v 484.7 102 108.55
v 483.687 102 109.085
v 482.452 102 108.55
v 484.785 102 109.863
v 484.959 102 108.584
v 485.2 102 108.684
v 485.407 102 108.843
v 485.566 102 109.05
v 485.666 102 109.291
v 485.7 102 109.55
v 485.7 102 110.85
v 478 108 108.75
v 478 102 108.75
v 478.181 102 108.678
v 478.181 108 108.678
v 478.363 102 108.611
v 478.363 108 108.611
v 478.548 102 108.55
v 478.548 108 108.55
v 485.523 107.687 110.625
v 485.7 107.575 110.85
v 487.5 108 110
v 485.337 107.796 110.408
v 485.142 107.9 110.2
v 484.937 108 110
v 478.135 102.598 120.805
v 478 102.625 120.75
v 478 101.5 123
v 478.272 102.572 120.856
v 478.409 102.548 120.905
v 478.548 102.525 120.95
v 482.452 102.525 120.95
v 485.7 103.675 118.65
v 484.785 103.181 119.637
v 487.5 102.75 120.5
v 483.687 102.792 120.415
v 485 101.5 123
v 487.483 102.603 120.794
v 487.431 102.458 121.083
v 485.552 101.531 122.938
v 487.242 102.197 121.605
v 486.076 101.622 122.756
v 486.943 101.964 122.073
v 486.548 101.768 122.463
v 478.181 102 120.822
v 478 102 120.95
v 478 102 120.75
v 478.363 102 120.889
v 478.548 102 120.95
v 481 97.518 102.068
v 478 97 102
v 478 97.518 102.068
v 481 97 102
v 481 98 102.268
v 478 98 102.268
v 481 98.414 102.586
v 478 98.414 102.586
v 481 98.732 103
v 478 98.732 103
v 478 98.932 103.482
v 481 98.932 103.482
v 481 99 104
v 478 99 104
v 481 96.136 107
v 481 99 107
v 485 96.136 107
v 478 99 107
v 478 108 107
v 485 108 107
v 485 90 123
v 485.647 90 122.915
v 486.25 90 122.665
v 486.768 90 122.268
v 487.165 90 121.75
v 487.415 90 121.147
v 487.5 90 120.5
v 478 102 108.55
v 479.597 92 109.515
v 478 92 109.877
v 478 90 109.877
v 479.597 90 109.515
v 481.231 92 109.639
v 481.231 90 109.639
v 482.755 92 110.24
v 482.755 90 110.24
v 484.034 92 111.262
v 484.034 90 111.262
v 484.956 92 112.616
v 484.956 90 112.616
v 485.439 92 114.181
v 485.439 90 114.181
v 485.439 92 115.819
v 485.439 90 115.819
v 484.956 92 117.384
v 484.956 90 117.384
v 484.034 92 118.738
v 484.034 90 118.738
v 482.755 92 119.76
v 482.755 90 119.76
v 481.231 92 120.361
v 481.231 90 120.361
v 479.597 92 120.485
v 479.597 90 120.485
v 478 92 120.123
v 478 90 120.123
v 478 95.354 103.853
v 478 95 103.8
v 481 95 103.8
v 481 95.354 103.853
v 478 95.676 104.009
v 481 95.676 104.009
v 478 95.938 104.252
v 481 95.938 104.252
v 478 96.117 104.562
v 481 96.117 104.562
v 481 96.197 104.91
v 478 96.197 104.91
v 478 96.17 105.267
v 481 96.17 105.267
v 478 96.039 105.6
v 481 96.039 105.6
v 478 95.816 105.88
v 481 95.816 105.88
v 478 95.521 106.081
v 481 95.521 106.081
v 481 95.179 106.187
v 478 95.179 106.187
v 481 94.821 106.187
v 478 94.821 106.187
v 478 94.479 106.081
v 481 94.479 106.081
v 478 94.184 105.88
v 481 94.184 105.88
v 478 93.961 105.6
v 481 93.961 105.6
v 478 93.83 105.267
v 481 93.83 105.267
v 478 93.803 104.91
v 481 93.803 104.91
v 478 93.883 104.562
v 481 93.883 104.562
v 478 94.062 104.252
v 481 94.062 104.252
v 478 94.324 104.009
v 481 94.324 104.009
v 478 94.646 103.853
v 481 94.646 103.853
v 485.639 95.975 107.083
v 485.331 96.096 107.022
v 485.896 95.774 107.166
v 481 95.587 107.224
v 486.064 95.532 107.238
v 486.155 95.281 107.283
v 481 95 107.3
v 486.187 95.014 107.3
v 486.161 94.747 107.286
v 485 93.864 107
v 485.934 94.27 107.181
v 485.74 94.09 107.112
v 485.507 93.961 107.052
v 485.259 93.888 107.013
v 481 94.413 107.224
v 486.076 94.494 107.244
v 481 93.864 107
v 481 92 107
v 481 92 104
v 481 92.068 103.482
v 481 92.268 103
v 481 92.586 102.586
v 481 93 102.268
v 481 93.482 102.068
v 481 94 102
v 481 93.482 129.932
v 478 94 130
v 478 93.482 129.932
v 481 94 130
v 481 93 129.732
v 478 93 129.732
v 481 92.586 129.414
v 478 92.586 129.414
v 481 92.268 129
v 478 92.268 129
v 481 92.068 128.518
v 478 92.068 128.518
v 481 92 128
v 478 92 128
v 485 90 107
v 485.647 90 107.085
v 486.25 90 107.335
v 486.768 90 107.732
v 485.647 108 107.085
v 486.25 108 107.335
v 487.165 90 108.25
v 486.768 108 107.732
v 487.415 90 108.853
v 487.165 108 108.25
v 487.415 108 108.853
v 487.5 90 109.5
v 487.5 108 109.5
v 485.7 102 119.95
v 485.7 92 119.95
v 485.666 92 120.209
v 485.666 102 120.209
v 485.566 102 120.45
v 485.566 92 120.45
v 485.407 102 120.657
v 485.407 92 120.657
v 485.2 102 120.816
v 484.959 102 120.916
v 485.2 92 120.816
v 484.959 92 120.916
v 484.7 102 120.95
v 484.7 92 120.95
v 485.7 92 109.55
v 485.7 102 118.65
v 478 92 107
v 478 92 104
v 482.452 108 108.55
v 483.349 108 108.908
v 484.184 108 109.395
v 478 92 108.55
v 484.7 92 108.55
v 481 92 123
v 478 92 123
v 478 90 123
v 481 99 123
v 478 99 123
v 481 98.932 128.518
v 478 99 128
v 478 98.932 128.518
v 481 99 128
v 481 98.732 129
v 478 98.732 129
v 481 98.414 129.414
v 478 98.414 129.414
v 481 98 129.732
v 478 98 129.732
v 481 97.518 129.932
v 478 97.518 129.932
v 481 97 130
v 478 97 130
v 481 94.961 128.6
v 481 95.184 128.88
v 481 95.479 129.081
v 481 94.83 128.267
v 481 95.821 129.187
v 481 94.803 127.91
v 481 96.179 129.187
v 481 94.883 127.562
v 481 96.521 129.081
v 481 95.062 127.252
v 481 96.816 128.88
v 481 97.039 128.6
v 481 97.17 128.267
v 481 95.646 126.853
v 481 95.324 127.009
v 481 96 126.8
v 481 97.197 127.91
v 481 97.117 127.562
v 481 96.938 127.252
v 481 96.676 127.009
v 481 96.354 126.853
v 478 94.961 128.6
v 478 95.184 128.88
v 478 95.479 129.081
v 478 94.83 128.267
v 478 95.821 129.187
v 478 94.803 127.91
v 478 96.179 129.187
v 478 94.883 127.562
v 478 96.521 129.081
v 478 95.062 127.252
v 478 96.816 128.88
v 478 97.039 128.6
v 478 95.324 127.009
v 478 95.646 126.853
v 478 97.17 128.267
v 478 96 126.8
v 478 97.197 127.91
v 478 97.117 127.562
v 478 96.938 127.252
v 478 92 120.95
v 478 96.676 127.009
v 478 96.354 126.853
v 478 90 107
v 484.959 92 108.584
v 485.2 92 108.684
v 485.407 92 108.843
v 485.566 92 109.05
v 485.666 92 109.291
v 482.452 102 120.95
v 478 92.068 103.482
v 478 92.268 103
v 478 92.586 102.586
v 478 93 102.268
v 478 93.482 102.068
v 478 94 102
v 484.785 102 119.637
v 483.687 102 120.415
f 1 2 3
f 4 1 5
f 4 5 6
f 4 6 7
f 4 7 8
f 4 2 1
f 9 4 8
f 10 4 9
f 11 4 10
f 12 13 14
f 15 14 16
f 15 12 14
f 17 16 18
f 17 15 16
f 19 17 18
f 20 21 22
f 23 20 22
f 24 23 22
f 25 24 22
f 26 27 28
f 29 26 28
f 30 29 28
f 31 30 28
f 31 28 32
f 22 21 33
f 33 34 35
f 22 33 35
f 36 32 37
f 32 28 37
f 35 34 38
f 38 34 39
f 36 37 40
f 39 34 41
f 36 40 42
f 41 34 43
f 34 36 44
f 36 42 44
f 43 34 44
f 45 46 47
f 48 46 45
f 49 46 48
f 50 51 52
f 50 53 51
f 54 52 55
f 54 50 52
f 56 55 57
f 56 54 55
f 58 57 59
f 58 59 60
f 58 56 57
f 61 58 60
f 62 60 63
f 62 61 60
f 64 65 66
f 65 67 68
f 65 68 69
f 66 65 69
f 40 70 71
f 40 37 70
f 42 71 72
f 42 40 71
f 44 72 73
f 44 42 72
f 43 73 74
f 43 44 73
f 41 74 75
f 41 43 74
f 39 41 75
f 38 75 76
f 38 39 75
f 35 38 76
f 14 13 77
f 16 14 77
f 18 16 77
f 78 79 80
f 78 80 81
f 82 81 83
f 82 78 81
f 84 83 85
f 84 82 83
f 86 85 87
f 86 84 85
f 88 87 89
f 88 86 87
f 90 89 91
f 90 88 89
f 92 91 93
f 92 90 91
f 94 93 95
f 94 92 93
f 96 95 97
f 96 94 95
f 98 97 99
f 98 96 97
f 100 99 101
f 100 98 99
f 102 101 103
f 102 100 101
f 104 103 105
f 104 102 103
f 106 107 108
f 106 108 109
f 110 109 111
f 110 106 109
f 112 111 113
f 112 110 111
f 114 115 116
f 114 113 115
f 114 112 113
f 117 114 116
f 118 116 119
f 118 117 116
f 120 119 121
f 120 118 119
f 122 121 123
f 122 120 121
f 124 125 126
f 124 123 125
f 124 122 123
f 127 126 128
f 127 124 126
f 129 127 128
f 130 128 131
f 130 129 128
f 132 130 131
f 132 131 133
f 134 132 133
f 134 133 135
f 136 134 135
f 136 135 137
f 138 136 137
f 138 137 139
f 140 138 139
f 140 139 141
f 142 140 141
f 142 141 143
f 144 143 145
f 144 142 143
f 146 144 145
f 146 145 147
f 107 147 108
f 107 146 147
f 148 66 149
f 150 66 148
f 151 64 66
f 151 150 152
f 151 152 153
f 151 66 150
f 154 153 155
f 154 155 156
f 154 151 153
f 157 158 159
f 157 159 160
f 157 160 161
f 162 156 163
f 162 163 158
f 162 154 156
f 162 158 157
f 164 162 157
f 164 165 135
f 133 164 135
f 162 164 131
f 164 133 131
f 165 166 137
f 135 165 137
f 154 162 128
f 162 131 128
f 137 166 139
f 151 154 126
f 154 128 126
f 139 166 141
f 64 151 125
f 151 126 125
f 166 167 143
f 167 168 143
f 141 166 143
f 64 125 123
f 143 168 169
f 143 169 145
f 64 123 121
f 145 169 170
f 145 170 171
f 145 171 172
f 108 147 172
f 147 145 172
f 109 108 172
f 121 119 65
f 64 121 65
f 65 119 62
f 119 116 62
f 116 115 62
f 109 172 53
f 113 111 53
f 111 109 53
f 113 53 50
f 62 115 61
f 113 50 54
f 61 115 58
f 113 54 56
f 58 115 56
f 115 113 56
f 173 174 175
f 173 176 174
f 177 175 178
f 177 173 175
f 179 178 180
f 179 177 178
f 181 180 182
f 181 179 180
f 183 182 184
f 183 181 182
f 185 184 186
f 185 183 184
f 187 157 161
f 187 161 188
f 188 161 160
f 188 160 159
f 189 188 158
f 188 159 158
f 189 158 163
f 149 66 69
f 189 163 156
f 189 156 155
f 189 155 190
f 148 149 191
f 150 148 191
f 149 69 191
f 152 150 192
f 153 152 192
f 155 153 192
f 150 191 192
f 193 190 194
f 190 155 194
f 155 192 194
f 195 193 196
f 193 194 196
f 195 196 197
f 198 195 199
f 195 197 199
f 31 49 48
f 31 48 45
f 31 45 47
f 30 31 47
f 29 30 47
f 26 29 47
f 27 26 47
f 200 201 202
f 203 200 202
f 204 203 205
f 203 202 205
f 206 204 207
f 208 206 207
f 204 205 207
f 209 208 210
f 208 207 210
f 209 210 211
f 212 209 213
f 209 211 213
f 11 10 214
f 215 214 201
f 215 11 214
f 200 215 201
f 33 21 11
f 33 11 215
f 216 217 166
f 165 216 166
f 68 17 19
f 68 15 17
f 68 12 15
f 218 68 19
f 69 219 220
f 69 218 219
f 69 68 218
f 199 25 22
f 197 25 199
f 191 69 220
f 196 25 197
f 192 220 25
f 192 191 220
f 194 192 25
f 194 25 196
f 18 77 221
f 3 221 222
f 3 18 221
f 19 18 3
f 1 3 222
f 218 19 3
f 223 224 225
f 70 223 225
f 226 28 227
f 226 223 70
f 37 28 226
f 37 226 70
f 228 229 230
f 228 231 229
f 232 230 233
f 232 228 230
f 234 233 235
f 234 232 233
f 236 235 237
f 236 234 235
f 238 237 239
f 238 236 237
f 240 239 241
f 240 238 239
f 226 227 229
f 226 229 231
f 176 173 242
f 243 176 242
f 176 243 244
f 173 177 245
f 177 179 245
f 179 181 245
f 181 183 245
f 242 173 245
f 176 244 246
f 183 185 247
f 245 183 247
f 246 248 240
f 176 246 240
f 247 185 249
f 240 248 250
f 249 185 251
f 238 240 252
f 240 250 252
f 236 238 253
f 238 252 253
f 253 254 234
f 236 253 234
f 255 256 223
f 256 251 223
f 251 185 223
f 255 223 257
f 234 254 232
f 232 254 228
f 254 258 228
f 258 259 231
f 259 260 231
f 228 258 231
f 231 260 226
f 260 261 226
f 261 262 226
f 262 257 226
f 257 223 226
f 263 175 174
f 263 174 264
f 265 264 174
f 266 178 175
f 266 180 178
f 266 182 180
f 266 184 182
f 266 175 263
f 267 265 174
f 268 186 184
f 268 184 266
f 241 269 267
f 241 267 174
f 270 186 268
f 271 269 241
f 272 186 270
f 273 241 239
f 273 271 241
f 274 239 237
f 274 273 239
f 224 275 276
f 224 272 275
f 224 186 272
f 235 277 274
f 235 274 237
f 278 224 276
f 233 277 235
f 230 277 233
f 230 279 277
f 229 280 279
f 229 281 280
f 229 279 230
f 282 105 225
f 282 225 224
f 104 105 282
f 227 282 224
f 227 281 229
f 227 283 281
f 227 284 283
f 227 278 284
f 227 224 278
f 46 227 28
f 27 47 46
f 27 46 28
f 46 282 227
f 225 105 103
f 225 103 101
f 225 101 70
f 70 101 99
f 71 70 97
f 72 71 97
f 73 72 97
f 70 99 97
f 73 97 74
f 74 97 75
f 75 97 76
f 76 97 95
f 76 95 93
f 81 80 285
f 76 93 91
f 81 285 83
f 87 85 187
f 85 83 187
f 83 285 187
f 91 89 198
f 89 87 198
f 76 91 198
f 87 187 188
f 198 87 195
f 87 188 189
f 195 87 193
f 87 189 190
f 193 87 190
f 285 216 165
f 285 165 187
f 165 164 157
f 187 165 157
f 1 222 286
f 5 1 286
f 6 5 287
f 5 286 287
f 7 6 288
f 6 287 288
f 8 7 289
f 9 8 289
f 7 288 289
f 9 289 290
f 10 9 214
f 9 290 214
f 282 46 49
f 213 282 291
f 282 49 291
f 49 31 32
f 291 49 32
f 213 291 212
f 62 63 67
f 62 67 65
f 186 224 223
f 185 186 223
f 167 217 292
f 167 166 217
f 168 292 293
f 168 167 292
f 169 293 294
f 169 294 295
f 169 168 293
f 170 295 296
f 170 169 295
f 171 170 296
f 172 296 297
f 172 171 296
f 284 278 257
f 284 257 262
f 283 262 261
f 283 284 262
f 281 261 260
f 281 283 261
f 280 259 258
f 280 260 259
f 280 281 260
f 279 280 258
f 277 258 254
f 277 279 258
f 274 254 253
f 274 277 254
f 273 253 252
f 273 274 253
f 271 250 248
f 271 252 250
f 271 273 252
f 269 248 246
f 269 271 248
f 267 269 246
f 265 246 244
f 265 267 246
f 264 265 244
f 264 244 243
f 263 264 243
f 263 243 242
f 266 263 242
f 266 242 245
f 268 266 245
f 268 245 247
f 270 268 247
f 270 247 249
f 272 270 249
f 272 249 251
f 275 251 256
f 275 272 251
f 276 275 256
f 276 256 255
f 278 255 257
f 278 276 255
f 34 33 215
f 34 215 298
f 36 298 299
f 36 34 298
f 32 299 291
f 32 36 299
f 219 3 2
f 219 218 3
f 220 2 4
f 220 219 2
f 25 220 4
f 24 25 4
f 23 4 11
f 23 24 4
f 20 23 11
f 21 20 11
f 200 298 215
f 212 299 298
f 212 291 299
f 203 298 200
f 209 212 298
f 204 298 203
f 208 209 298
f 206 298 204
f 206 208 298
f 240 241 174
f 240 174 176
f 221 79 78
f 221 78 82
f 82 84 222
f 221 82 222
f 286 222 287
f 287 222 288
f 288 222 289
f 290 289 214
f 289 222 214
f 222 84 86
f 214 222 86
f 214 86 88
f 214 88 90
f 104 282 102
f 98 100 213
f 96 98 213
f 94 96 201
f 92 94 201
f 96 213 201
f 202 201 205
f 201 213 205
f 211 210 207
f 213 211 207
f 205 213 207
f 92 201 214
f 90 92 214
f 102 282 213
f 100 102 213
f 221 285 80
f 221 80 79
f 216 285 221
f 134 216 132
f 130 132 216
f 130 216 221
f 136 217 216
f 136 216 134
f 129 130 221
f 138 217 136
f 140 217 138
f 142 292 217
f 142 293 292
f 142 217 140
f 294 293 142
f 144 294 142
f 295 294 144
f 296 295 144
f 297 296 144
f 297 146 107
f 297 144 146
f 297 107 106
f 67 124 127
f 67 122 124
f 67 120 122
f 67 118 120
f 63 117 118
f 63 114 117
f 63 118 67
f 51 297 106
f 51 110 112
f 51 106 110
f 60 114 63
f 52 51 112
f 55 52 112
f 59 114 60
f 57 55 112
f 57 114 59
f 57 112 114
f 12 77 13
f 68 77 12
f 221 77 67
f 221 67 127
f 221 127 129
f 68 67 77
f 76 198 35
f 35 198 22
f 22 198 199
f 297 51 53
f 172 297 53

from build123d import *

# Parameters (mm, degrees)
BOX520_W                  = 10.4
BOX520_H                  = 12.4
BOX520_DEPTH              = 27
FILLET403_R               = 1
CYLINDER1231_R            = 8
CYLINDER1231_DEPTH        = 27
CYLINDER1233_R            = 6.5
CYLINDER1233_DEPTH        = 17
CYLINDER1232_R            = 8
CYLINDER1232_DEPTH        = 17
CYLINDER1234_R            = 8
CYLINDER1234_DEPTH        = 27
CUT014272_PLACEMENT_ANGLE = 90
CYLINDER1230_R            = 5.5
CYLINDER1230_DEPTH        = 15
CYLINDER1229_R            = 1.2
CYLINDER1229_DEPTH        = 11
CYLINDER1228_R            = 1.2
CYLINDER1228_DEPTH        = 11
CYLINDER1275_R            = 2.3
CYLINDER1275_DEPTH        = 11
BOX519_W                  = 9.5
BOX519_H                  = 18
BOX519_DEPTH              = 16
CHAMFER036_SIZE2          = 6.5
CHAMFER036_SIZE           = 13
FILLET409_R               = 2.5
BOX542_W                  = 3
BOX542_H                  = 7
BOX542_DEPTH              = 28
FILLET415_R               = 2


with BuildPart() as fillet403:
    # Box520 → Box520 (new body)
    with BuildSketch(Plane(origin=(-5.2, -6.2, 0), x_dir=(1, 0, 0), z_dir=(0, 0, 1))):
        with Locations((5.2, 6.2)):
            Rectangle(BOX520_W, BOX520_H)
    extrude(amount=BOX520_DEPTH)

    # Fillet403
    fillet403_edges = [fillet403.edges().sort_by_distance(p)[0] for p in [
        (-5.2, -6.2, 13.5),
        (-5.2, 6.2, 13.5),
        (5.2, -6.2, 13.5),
        (5.2, 6.2, 13.5),
    ]]
    fillet(fillet403_edges, radius=FILLET403_R)


with BuildPart() as cut014271:
    # Cylinder1231 → Cylinder1231 (new body)
    with BuildSketch(Plane.XY):
        Circle(CYLINDER1231_R)
    extrude(amount=CYLINDER1231_DEPTH)

    # Cut014271: cut Fillet403
    add(fillet403.part, mode=Mode.SUBTRACT)


with BuildPart() as cylinder1429:
    # Cylinder1233 → Cylinder1233 (new body)
    with BuildSketch(Plane.XY):
        Circle(CYLINDER1233_R)
    extrude(amount=CYLINDER1233_DEPTH)


with BuildPart() as fusion248002050137:
    # Cylinder1232 → Cylinder1232 (new body)
    with BuildSketch(Plane.XY):
        Circle(CYLINDER1232_R)
    extrude(amount=CYLINDER1232_DEPTH)

    # Cut014270: cut Cylinder1429
    add(cylinder1429.part, mode=Mode.SUBTRACT)

    # Fusion248002050137: union Cut014271
    add(cut014271.part)


with BuildPart() as bucket_turning_motor002:
    # Cylinder1234 → Cylinder1234 (new body)
    with BuildSketch(Plane.XY):
        Circle(CYLINDER1234_R)
    extrude(amount=CYLINDER1234_DEPTH)

    # Cut014272: cut Fusion248002050137
    add(fusion248002050137.part, mode=Mode.SUBTRACT)


with BuildPart() as bucket_turning_motor002_1:
    # Cut014272 placement: moved
    add(bucket_turning_motor002.part.moved(Location((480.5, 119, 114.75))).rotate(Axis((480.5, 119, 114.75), (1, 0, 0)), CUT014272_PLACEMENT_ANGLE))


with BuildPart() as cylinder1230:
    # Cylinder1230 → Cylinder1230 (new body)
    with BuildSketch(Plane(origin=(480, 92, 115), x_dir=(1, 0, 0), z_dir=(0, -1, 0))):
        Circle(CYLINDER1230_R)
    extrude(amount=CYLINDER1230_DEPTH)


with BuildPart() as cylinder1229:
    # Cylinder1229 → Cylinder1229 (new body)
    with BuildSketch(Plane(origin=(476, 95, 105), x_dir=(0, 0, -1), z_dir=(1, 0, 0))):
        Circle(CYLINDER1229_R)
    extrude(amount=CYLINDER1229_DEPTH)


with BuildPart() as fusion248002050197:
    # Cylinder1228 → Cylinder1228 (new body)
    with BuildSketch(Plane(origin=(476, 96, 128), x_dir=(0, 0, -1), z_dir=(1, 0, 0))):
        Circle(CYLINDER1228_R)
    extrude(amount=CYLINDER1228_DEPTH)

    # Fusion248002050197: union Cylinder1229
    add(cylinder1229.part)


with BuildPart() as cylinder1275:
    # Cylinder1275 → Cylinder1275 (new body)
    with BuildSketch(Plane(origin=(481, 95, 105), x_dir=(0, 0, -1), z_dir=(1, 0, 0))):
        Circle(CYLINDER1275_R)
    extrude(amount=CYLINDER1275_DEPTH)


with BuildPart() as fillet409:
    # Box519 → Box519 (new body)
    with BuildSketch(Plane(origin=(478, 90, 107), x_dir=(1, 0, 0), z_dir=(0, 0, 1))):
        with Locations((4.75, 9)):
            Rectangle(BOX519_W, BOX519_H)
    extrude(amount=BOX519_DEPTH)

    # Chamfer036
    chamfer036_edges = [fillet409.edges().sort_by_distance(p)[0] for p in [
        (482.75, 108, 123),
    ]]
    chamfer036_side = fillet409.faces().sort_by_distance((482.75, 108, 115))[0]
    chamfer(chamfer036_edges, length=CHAMFER036_SIZE, length2=CHAMFER036_SIZE2, reference=chamfer036_side)

    # Fillet409
    fillet409_edges = [fillet409.edges().sort_by_distance(p)[0] for p in [
        (487.5, 95.75, 123),
        (487.5, 99, 107),
    ]]
    fillet(fillet409_edges, radius=FILLET409_R)


with BuildPart() as bucket_rotating_motor_holder:
    # Box542 → Box542 (new body)
    with BuildSketch(Plane(origin=(478, 92, 102), x_dir=(1, 0, 0), z_dir=(0, 0, 1))):
        with Locations((1.5, 3.5)):
            Rectangle(BOX542_W, BOX542_H)
    extrude(amount=BOX542_DEPTH)

    # Fusion248002050208: union Fillet409
    add(fillet409.part)

    # Cut014334: cut Cylinder1275
    add(cylinder1275.part, mode=Mode.SUBTRACT)

    # Cut014335: cut Fusion248002050197
    add(fusion248002050197.part, mode=Mode.SUBTRACT)

    # Cut014336: cut Cylinder1230
    add(cylinder1230.part, mode=Mode.SUBTRACT)

    # Cut014337: cut bucket-turning-motor002
    add(bucket_turning_motor002_1.part, mode=Mode.SUBTRACT)

    # Fillet415
    fillet415_edges = [bucket_rotating_motor_holder.edges().sort_by_distance(p)[0] for p in [
        (479.5, 99, 102),
        (479.5, 92, 102),
        (479.5, 99, 130),
        (479.5, 92, 130),
    ]]
    fillet(fillet415_edges, radius=FILLET415_R)


solid = bucket_rotating_motor_holder.part
